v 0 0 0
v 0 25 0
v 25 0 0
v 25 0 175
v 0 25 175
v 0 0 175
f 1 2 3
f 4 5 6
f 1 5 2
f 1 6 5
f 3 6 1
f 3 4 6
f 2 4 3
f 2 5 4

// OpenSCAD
module triangle(o_len, a_len, depth, center = false)
{
    centroid = center ? [ -a_len / 3, -o_len / 3, -depth / 2 ] : [ 0, 0, 0 ];
    translate(centroid) linear_extrude(height = depth)
    {
        polygon(points = [ [ 0, 0 ], [ a_len, 0 ], [ 0, o_len ] ], paths = [[ 0, 1, 2 ]]);
    }
}

/**
 * Standard right-angled triangle (tangent version)
 *
 * @param number  tan_angle Angle of adjacent to hypotenuse (ie tangent)
 * @param number  a_len     Length of the adjacent side
 * @param number  depth     How wide/deep the triangle is in the 3rd dimension
 * @param boolean center    Whether to center the triangle on the origin
 */
module a_triangle(tan_angle, a_len, depth, center = false)
{
    triangle(tan(tan_angle) * a_len, a_len, depth, center);
}

a_triangle(45, 25, 175);
